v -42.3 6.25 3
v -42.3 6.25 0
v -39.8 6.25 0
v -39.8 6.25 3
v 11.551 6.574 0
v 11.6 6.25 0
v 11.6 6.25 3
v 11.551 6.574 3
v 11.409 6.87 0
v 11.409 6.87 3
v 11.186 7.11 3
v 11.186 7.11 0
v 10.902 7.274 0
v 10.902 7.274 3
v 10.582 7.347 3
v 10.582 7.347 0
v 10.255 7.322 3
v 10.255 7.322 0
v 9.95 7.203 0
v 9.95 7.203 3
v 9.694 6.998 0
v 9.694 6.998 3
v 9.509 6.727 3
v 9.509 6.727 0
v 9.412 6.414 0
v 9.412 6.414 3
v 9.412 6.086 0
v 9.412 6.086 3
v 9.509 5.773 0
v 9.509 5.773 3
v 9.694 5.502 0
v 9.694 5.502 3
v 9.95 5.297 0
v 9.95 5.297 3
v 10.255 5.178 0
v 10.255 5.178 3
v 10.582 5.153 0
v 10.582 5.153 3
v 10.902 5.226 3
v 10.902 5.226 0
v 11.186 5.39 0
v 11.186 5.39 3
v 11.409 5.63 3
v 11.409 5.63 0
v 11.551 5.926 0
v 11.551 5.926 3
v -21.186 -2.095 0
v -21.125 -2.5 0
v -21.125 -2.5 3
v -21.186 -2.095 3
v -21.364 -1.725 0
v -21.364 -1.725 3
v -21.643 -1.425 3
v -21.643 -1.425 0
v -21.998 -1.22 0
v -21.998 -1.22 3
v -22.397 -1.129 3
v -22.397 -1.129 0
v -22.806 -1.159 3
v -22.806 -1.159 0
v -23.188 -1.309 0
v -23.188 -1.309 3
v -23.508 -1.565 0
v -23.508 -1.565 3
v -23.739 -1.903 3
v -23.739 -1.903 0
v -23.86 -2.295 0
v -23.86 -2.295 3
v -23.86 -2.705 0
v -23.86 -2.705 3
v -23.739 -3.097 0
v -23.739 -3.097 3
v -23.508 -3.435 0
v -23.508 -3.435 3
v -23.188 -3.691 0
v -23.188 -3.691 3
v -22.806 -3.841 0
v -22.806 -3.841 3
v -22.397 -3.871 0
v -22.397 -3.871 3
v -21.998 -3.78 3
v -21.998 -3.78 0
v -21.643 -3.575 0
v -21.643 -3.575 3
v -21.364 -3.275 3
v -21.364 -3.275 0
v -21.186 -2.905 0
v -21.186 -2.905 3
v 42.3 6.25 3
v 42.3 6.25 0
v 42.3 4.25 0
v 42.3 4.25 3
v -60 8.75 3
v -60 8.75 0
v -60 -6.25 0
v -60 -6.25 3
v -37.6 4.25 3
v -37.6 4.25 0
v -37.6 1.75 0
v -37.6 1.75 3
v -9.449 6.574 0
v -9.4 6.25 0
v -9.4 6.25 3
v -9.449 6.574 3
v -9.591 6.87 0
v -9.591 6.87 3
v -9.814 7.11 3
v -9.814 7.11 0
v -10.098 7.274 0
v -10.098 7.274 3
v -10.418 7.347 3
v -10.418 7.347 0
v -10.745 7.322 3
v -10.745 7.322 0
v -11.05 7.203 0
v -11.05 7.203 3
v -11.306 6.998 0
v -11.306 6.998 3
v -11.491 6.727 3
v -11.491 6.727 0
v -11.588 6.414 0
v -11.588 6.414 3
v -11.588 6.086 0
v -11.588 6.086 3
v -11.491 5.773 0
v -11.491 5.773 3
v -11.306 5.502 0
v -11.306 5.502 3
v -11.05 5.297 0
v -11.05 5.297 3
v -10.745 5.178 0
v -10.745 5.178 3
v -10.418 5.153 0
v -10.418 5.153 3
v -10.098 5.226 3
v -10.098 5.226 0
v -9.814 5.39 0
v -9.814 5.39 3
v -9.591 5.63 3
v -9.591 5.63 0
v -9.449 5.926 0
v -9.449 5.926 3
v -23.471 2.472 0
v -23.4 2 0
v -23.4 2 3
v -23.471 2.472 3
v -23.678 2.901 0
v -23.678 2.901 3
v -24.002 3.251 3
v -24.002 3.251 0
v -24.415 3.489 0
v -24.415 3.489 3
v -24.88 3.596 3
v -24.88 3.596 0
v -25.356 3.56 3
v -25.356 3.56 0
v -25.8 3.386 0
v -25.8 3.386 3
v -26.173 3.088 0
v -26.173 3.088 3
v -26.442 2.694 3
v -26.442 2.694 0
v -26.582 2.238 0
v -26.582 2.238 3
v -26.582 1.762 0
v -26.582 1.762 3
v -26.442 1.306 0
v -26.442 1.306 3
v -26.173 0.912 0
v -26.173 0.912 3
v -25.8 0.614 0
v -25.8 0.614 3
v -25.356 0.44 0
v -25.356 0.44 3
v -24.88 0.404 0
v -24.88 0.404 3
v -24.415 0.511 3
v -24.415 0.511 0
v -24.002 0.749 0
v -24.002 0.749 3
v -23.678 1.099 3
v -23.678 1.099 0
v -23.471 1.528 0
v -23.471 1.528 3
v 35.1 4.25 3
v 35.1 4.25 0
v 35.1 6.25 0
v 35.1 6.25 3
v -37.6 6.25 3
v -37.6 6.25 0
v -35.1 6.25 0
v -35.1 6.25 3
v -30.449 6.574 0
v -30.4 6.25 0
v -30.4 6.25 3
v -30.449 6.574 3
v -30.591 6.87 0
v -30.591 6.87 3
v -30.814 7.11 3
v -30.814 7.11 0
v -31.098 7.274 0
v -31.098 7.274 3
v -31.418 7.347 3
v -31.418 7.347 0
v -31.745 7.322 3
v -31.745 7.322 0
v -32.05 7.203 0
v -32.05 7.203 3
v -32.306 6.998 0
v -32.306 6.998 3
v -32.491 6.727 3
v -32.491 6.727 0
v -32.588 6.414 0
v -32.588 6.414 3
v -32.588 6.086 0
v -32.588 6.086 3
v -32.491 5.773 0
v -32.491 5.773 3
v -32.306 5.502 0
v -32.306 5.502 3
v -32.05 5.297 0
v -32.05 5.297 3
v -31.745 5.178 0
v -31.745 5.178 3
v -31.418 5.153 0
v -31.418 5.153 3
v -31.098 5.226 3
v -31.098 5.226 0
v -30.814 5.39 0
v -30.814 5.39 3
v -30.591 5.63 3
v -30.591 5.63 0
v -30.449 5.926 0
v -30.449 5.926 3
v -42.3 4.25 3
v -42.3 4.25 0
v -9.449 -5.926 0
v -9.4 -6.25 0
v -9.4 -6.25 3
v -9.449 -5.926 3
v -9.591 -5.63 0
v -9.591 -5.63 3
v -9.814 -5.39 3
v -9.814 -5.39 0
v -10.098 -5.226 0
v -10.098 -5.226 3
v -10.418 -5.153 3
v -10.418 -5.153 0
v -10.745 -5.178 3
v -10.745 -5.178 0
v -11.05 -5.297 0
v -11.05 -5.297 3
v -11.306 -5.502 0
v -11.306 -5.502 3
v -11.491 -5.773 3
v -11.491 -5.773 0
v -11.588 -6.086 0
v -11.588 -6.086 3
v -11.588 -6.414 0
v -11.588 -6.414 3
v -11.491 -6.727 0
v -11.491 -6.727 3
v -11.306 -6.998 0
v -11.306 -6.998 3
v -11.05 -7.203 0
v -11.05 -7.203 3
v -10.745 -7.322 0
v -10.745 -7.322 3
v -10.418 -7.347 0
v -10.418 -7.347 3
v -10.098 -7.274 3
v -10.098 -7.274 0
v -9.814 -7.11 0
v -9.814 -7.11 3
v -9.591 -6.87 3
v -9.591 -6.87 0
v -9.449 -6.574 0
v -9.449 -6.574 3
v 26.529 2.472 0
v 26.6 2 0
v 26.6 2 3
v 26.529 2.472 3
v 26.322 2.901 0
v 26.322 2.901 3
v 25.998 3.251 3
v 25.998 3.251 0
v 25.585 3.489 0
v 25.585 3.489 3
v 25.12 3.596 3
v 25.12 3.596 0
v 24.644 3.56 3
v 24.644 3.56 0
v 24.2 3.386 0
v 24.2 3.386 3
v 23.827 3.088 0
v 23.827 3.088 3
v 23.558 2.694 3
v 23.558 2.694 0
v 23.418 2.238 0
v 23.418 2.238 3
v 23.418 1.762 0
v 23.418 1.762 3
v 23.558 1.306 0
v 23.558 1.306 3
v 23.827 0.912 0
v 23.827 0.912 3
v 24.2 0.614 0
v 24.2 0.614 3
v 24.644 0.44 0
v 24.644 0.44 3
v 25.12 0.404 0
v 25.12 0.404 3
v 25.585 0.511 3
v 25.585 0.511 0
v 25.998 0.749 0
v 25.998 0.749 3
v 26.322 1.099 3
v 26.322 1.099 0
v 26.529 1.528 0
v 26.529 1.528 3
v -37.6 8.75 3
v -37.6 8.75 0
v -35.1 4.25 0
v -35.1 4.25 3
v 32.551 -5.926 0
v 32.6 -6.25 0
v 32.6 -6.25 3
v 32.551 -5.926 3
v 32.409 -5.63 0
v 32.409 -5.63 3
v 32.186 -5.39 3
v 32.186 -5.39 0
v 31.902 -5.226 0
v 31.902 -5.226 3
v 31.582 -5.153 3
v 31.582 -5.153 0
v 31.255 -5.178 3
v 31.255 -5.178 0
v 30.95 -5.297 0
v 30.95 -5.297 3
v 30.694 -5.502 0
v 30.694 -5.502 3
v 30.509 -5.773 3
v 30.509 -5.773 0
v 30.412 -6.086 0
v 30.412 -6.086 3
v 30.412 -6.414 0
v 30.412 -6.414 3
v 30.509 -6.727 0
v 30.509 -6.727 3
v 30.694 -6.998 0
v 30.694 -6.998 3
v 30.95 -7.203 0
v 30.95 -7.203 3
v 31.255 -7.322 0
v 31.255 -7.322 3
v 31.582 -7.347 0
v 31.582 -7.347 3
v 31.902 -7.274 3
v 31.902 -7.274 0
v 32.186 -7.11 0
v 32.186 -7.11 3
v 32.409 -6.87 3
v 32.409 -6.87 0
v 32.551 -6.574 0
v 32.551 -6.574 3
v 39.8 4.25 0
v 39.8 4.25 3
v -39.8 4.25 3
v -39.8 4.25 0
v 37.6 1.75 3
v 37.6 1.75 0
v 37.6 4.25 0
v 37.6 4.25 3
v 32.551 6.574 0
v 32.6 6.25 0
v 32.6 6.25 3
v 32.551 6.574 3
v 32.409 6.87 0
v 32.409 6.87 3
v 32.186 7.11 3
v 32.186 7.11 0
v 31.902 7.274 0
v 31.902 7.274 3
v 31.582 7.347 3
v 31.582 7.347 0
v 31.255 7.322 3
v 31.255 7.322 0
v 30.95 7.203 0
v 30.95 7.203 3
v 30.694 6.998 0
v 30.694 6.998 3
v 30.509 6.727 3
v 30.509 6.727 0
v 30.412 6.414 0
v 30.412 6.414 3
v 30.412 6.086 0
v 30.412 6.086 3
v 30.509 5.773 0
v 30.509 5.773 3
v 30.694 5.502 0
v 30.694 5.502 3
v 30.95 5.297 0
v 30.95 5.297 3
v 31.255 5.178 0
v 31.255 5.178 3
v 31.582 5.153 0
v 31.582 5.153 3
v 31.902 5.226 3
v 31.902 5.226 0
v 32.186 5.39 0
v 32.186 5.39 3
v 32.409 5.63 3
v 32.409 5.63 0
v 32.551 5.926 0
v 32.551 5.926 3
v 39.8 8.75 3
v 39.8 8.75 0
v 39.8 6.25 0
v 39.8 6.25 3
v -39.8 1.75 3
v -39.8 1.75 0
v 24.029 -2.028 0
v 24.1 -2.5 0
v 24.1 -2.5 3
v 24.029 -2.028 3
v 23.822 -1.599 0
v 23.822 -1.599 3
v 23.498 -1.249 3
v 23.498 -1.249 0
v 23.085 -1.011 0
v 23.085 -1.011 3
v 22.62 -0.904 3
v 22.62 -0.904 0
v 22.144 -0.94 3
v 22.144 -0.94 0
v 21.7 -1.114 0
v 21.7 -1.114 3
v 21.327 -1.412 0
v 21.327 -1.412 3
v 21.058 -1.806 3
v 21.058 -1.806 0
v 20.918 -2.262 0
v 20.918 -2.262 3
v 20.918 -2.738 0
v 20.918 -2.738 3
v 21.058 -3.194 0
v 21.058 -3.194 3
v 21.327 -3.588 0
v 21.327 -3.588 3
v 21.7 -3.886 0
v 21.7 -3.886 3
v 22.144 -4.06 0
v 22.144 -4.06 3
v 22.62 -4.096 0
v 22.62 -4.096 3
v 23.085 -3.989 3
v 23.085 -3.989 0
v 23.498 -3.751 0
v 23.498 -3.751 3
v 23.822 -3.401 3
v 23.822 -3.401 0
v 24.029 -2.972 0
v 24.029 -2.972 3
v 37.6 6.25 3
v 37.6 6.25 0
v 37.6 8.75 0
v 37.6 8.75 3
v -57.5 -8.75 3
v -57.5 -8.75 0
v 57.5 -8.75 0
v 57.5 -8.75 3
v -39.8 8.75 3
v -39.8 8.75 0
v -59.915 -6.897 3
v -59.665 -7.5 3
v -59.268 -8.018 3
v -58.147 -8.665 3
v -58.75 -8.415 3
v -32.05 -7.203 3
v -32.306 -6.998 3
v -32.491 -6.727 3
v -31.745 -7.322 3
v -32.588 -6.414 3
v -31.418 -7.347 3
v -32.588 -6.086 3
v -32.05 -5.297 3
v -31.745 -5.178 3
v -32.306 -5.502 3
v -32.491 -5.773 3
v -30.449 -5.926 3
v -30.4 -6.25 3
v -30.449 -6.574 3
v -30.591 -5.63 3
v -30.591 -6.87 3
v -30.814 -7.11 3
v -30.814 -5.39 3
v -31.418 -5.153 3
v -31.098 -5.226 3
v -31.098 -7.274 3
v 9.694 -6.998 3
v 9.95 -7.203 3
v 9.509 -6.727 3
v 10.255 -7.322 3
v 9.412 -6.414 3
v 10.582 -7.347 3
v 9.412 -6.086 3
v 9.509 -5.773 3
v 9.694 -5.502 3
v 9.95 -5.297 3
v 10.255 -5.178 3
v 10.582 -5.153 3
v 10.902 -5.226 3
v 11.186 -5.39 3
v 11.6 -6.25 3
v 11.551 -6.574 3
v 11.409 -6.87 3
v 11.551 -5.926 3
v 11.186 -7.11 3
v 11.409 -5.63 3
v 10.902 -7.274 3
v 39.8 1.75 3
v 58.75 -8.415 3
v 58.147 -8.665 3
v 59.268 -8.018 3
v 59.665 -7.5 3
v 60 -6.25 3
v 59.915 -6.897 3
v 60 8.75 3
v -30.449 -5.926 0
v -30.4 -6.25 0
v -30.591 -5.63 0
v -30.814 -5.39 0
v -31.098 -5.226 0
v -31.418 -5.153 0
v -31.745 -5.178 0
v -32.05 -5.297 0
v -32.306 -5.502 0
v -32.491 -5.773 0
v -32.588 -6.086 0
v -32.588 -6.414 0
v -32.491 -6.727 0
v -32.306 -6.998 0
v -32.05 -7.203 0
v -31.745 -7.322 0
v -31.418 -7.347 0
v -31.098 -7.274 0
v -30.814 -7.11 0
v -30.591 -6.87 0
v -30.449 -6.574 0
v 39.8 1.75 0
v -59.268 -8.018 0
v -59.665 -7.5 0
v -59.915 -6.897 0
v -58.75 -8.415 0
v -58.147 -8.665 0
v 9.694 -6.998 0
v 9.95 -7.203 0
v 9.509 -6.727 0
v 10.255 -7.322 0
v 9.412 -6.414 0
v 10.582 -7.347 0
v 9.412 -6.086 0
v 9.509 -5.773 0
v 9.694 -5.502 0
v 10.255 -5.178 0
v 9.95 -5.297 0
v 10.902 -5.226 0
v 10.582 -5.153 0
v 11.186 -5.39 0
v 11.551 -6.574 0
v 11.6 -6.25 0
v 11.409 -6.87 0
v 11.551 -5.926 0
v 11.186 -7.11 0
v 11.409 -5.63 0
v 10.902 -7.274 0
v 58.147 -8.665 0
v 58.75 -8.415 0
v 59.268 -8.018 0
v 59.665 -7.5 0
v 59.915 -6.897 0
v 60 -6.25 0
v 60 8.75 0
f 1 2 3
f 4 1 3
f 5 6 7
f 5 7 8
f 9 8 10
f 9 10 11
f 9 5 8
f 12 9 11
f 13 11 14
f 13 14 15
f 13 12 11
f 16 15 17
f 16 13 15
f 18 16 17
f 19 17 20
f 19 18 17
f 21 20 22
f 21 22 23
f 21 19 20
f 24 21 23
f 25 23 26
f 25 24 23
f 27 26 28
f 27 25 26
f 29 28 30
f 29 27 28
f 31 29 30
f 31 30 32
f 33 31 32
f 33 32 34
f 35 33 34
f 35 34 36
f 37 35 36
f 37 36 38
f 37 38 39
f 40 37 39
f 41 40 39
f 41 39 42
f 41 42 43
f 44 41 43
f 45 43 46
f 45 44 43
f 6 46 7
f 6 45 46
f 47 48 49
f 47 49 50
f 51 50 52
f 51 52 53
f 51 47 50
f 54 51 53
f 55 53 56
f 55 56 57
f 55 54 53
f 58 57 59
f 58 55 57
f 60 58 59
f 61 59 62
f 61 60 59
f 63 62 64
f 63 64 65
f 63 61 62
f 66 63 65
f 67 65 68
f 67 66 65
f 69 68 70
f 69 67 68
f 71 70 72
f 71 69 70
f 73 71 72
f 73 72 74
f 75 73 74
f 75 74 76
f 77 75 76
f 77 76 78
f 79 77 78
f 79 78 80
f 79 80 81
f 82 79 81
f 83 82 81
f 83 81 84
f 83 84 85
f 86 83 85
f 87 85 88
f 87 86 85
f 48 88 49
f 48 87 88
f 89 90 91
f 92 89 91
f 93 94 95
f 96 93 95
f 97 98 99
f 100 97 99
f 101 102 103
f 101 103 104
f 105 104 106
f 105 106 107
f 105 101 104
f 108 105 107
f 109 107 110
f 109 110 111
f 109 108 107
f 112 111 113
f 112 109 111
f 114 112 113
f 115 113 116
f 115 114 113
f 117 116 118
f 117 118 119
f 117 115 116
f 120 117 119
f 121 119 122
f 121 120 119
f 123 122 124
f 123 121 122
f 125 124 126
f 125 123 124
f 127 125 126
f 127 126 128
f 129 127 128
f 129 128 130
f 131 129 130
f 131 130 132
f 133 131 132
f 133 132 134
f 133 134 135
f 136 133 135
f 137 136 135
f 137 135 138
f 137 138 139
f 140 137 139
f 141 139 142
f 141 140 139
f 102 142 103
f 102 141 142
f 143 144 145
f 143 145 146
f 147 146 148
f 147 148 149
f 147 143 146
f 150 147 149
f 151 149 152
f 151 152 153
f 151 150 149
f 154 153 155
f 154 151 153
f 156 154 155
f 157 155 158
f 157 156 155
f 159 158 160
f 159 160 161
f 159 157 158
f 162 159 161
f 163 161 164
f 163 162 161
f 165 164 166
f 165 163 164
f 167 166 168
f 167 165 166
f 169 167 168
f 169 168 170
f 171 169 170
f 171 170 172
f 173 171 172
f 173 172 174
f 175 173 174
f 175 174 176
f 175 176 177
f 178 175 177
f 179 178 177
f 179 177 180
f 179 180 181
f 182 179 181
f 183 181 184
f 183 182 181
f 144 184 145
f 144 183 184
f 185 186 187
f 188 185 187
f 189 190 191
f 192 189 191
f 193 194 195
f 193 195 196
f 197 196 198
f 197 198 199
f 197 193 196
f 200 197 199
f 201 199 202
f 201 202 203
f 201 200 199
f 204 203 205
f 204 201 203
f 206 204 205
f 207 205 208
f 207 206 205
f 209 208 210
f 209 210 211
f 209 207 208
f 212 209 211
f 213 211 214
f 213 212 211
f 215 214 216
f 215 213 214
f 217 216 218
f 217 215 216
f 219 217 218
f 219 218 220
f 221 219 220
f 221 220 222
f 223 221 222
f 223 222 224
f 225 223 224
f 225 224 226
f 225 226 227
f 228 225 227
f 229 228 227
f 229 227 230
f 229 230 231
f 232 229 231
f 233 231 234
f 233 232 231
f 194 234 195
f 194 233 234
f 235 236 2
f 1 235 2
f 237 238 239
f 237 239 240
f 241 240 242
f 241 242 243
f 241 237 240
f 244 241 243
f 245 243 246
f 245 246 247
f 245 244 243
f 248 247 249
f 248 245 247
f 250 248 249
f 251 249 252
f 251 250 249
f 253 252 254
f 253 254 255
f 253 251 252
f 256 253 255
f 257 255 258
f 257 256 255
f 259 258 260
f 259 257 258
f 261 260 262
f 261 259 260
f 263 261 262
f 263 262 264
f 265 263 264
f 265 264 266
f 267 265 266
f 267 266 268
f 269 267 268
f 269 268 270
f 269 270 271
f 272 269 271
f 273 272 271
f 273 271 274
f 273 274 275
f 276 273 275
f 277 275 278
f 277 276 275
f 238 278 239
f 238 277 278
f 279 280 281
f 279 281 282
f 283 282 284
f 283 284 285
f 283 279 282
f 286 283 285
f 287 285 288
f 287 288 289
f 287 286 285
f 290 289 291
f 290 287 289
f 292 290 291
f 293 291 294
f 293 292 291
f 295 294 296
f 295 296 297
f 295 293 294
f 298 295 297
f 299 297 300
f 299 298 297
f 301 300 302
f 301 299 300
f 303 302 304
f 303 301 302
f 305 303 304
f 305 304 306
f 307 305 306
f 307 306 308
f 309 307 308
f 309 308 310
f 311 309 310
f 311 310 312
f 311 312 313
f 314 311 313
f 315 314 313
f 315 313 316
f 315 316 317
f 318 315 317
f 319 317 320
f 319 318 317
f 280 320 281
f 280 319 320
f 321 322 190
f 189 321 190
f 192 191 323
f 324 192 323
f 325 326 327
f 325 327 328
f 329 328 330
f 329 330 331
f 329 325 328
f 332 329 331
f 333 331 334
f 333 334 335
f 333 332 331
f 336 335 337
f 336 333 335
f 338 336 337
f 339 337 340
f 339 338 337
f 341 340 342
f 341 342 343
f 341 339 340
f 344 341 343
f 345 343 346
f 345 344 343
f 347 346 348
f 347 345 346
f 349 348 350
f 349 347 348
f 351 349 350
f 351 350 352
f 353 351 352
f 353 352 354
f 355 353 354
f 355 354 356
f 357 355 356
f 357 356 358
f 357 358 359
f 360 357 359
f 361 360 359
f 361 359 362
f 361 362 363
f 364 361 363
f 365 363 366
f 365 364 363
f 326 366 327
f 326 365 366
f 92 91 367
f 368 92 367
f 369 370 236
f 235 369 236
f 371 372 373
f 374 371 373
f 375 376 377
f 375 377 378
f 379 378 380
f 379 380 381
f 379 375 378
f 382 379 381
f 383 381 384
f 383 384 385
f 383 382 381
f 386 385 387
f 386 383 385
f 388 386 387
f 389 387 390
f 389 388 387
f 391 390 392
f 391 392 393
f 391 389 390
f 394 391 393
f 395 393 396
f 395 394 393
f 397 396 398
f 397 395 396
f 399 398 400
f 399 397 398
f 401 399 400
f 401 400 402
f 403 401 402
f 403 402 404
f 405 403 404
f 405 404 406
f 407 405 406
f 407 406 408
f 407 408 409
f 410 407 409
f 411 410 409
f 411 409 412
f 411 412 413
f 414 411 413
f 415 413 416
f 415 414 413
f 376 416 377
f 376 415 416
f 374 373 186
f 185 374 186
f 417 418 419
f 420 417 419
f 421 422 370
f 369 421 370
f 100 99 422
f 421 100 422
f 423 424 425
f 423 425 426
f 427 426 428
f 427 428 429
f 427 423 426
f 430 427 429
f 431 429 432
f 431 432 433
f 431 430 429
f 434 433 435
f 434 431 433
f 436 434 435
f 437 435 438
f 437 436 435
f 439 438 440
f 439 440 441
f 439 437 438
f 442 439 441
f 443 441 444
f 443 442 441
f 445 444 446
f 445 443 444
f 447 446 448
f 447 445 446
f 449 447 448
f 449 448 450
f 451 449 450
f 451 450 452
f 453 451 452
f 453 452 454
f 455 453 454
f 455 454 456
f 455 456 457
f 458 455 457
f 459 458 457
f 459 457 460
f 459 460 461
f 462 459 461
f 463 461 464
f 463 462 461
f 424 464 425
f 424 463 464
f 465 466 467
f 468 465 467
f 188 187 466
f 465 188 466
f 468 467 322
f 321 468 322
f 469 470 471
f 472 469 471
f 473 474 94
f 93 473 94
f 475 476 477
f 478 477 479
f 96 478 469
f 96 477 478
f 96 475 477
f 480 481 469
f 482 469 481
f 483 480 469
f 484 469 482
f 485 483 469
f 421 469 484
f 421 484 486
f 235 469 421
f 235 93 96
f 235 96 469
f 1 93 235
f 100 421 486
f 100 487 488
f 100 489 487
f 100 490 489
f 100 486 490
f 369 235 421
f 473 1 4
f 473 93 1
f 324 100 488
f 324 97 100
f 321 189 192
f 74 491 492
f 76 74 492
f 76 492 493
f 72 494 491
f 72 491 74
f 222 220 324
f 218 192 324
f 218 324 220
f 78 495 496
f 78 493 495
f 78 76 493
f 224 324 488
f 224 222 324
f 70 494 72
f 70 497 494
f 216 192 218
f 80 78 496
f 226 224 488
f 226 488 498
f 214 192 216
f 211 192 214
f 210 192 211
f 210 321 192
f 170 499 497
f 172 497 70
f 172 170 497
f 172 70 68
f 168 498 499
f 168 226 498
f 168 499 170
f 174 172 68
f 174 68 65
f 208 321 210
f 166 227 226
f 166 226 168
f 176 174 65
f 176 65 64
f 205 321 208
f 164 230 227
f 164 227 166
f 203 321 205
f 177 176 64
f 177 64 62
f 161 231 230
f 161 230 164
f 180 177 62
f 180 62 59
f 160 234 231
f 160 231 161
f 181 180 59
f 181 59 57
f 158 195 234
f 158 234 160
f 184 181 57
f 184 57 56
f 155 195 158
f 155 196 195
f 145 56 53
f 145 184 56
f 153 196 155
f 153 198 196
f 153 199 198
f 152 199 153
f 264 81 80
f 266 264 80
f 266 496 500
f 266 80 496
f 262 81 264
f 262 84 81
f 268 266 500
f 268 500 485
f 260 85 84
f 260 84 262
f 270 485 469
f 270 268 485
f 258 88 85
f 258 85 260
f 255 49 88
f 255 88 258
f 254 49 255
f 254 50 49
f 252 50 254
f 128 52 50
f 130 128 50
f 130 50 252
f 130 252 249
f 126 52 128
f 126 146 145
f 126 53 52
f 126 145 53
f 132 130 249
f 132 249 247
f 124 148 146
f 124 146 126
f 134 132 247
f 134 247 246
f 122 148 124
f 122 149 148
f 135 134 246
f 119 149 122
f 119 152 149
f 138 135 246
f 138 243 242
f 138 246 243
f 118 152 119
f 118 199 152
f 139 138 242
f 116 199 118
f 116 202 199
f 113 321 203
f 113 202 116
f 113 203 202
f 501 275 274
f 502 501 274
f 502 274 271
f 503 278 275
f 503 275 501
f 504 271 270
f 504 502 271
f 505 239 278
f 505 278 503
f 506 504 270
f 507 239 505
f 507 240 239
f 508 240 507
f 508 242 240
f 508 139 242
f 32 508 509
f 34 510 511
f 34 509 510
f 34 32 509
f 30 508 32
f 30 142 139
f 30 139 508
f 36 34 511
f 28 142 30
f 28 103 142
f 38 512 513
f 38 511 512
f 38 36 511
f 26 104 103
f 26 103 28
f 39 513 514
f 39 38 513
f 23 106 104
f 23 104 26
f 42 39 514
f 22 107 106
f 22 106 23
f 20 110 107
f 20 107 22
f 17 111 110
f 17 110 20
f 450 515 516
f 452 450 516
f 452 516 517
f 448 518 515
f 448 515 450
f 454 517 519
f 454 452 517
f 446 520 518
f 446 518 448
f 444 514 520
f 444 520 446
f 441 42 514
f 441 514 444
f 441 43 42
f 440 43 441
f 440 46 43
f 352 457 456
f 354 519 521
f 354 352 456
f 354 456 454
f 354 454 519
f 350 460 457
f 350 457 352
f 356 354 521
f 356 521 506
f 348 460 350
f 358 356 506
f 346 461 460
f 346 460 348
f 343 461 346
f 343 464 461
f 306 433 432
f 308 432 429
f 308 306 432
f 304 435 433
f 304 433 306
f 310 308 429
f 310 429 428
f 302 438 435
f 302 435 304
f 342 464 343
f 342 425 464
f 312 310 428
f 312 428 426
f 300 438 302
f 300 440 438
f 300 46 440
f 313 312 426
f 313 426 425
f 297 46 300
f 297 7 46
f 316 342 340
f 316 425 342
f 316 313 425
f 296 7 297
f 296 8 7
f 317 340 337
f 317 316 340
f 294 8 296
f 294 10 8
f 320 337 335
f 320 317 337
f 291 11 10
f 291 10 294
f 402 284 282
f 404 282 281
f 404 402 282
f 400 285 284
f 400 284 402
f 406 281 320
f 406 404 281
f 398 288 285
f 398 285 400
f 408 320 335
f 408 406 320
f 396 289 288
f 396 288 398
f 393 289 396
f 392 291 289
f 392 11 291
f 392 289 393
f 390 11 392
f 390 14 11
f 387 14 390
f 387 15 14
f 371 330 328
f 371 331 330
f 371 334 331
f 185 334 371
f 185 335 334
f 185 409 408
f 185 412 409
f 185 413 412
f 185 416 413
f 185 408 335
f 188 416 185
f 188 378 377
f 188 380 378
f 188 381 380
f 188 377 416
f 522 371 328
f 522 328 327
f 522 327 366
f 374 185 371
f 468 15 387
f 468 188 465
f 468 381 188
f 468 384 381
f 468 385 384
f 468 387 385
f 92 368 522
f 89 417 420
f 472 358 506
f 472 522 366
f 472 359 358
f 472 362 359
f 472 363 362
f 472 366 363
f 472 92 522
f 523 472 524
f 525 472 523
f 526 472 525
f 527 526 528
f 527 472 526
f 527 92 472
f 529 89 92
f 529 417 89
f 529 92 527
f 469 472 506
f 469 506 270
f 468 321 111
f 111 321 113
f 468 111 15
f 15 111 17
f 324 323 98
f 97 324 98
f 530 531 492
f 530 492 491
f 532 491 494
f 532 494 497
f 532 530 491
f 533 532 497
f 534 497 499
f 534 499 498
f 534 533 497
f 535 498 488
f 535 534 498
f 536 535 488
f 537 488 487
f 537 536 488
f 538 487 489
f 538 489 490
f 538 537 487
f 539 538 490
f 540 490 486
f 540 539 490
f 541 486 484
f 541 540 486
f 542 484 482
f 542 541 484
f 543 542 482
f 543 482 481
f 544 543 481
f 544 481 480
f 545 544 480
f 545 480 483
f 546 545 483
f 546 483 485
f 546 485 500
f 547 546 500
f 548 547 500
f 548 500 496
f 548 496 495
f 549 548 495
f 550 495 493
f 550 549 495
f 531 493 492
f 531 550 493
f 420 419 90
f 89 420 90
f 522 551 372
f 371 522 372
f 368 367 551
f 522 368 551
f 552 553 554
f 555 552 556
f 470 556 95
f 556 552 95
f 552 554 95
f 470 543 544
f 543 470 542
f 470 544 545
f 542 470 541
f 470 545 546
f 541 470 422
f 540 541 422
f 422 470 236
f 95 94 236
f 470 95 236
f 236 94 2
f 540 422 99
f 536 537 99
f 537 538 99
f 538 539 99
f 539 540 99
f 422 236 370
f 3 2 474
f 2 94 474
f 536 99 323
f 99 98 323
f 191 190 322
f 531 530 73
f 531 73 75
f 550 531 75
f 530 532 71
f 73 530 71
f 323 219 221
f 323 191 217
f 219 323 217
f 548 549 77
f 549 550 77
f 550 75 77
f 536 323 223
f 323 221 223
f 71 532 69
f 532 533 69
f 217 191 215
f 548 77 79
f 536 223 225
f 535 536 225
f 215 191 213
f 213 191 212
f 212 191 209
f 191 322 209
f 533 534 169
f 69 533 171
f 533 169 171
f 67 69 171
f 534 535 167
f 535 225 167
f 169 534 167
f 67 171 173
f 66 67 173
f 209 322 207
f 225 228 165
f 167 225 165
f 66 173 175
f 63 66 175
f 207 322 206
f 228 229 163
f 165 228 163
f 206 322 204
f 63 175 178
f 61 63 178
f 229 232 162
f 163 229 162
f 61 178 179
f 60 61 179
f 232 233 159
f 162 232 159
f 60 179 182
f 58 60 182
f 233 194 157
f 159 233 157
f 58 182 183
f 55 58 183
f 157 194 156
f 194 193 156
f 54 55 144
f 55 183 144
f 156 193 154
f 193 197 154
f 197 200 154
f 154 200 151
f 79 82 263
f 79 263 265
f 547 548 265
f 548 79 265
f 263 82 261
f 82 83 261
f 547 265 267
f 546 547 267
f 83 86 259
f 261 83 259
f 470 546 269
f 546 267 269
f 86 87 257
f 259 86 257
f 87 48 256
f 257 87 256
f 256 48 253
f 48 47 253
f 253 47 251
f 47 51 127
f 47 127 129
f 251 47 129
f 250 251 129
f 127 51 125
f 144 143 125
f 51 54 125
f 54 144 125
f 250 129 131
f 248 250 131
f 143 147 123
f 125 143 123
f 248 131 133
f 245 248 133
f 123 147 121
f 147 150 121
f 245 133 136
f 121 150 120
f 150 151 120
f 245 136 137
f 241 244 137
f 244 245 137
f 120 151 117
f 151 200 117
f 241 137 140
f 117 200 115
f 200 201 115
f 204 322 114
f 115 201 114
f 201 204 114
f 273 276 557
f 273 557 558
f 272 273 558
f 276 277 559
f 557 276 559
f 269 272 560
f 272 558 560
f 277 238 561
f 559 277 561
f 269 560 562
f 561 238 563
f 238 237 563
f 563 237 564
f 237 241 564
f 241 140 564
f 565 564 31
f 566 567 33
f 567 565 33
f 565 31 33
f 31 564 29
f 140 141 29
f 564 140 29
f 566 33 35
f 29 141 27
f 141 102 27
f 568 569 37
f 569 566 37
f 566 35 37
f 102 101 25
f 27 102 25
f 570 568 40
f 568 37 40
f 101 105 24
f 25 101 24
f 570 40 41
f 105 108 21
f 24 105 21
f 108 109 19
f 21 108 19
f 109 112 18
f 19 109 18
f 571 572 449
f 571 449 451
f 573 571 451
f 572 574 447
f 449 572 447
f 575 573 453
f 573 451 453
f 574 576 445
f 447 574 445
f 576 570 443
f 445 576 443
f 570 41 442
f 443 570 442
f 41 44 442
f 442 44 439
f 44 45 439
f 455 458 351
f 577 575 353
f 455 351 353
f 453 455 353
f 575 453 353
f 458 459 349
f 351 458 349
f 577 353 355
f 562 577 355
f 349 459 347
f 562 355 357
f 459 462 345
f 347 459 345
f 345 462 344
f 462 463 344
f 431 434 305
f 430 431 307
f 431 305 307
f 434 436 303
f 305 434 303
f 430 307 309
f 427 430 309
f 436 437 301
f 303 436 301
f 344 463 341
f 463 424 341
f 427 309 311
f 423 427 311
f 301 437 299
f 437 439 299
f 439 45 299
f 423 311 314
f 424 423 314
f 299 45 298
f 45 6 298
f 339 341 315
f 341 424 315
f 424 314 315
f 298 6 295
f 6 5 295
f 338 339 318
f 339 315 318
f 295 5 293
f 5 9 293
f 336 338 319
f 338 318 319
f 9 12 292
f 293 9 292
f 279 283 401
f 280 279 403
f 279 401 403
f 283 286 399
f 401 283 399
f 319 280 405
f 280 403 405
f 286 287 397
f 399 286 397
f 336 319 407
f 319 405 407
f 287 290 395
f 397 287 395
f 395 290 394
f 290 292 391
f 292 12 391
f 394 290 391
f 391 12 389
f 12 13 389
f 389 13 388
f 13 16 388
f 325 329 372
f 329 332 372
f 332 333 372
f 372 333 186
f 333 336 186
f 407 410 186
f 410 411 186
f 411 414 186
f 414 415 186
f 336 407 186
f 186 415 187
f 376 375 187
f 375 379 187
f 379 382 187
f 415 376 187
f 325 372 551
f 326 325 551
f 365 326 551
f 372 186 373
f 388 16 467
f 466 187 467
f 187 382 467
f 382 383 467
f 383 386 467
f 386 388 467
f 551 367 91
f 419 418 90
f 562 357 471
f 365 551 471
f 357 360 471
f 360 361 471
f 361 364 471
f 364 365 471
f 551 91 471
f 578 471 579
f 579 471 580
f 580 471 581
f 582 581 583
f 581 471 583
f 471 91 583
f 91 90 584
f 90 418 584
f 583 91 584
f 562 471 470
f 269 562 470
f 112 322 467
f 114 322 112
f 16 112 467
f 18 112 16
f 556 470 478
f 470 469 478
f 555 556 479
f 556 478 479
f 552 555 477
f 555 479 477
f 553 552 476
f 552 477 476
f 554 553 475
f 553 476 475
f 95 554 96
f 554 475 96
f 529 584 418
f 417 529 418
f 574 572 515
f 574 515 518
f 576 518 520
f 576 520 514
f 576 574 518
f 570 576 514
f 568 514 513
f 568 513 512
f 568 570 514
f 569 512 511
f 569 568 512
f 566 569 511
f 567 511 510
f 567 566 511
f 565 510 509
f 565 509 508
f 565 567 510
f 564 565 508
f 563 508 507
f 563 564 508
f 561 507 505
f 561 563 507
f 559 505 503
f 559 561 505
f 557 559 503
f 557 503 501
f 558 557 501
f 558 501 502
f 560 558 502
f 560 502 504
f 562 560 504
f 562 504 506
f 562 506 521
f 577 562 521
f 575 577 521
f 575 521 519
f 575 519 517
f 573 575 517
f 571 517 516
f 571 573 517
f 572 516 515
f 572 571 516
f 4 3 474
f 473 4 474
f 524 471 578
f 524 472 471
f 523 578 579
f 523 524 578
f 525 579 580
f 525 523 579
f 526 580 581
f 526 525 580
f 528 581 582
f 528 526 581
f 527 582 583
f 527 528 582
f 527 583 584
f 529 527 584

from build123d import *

# Parameters (mm, degrees)
SKETCH1_R           = 1.1
SKETCH1_R_2         = 1.6
SKETCH1_R_3         = 1.375
BOSS_EXTRUDE1_DEPTH = 3
FILLET1_R           = 2.5


with BuildPart() as part:
    # Sketch1 → Boss-Extrude1 (new body)
    with BuildSketch(Plane.XY):
        Polygon((-60, -8.75), (60, -8.75), (60, 8.75), (39.8, 8.75), (39.8, 6.25), (42.3, 6.25), (42.3, 4.25), (39.8, 4.25), (39.8, 1.75), (37.6, 1.75), (37.6, 4.25), (35.1, 4.25), (35.1, 6.25), (37.6, 6.25), (37.6, 8.75), (-37.6, 8.75), (-37.6, 6.25), (-35.1, 6.25), (-35.1, 4.25), (-37.6, 4.25), (-37.6, 1.75), (-39.8, 1.75), (-39.8, 4.25), (-42.3, 4.25), (-42.3, 6.25), (-39.8, 6.25), (-39.8, 8.75), (-60, 8.75), align=None)
        with Locations((-10.5, 6.25)):
            Circle(SKETCH1_R, mode=Mode.SUBTRACT)
        with Locations((-10.5, -6.25)):
            Circle(SKETCH1_R, mode=Mode.SUBTRACT)
        with Locations((10.5, -6.25)):
            Circle(SKETCH1_R, mode=Mode.SUBTRACT)
        with Locations((10.5, 6.25)):
            Circle(SKETCH1_R, mode=Mode.SUBTRACT)
        with Locations((-31.5, 6.25)):
            Circle(SKETCH1_R, mode=Mode.SUBTRACT)
        with Locations((-31.5, -6.25)):
            Circle(SKETCH1_R, mode=Mode.SUBTRACT)
        with Locations((31.5, -6.25)):
            Circle(SKETCH1_R, mode=Mode.SUBTRACT)
        with Locations((31.5, 6.25)):
            Circle(SKETCH1_R, mode=Mode.SUBTRACT)
        with Locations((25, 2)):
            Circle(SKETCH1_R_2, mode=Mode.SUBTRACT)
        with Locations((-25, 2)):
            Circle(SKETCH1_R_2, mode=Mode.SUBTRACT)
        with Locations((22.5, -2.5)):
            Circle(SKETCH1_R_2, mode=Mode.SUBTRACT)
        with Locations((-22.5, -2.5)):
            Circle(SKETCH1_R_3, mode=Mode.SUBTRACT)
    extrude(amount=BOSS_EXTRUDE1_DEPTH)

    # Fillet1
    fillet1_edges = [part.edges().sort_by_distance(p)[0] for p in [
        (60, -8.75, 1.5),
        (-60, -8.75, 1.5),
    ]]
    fillet(fillet1_edges, radius=FILLET1_R)


solid = part.part
